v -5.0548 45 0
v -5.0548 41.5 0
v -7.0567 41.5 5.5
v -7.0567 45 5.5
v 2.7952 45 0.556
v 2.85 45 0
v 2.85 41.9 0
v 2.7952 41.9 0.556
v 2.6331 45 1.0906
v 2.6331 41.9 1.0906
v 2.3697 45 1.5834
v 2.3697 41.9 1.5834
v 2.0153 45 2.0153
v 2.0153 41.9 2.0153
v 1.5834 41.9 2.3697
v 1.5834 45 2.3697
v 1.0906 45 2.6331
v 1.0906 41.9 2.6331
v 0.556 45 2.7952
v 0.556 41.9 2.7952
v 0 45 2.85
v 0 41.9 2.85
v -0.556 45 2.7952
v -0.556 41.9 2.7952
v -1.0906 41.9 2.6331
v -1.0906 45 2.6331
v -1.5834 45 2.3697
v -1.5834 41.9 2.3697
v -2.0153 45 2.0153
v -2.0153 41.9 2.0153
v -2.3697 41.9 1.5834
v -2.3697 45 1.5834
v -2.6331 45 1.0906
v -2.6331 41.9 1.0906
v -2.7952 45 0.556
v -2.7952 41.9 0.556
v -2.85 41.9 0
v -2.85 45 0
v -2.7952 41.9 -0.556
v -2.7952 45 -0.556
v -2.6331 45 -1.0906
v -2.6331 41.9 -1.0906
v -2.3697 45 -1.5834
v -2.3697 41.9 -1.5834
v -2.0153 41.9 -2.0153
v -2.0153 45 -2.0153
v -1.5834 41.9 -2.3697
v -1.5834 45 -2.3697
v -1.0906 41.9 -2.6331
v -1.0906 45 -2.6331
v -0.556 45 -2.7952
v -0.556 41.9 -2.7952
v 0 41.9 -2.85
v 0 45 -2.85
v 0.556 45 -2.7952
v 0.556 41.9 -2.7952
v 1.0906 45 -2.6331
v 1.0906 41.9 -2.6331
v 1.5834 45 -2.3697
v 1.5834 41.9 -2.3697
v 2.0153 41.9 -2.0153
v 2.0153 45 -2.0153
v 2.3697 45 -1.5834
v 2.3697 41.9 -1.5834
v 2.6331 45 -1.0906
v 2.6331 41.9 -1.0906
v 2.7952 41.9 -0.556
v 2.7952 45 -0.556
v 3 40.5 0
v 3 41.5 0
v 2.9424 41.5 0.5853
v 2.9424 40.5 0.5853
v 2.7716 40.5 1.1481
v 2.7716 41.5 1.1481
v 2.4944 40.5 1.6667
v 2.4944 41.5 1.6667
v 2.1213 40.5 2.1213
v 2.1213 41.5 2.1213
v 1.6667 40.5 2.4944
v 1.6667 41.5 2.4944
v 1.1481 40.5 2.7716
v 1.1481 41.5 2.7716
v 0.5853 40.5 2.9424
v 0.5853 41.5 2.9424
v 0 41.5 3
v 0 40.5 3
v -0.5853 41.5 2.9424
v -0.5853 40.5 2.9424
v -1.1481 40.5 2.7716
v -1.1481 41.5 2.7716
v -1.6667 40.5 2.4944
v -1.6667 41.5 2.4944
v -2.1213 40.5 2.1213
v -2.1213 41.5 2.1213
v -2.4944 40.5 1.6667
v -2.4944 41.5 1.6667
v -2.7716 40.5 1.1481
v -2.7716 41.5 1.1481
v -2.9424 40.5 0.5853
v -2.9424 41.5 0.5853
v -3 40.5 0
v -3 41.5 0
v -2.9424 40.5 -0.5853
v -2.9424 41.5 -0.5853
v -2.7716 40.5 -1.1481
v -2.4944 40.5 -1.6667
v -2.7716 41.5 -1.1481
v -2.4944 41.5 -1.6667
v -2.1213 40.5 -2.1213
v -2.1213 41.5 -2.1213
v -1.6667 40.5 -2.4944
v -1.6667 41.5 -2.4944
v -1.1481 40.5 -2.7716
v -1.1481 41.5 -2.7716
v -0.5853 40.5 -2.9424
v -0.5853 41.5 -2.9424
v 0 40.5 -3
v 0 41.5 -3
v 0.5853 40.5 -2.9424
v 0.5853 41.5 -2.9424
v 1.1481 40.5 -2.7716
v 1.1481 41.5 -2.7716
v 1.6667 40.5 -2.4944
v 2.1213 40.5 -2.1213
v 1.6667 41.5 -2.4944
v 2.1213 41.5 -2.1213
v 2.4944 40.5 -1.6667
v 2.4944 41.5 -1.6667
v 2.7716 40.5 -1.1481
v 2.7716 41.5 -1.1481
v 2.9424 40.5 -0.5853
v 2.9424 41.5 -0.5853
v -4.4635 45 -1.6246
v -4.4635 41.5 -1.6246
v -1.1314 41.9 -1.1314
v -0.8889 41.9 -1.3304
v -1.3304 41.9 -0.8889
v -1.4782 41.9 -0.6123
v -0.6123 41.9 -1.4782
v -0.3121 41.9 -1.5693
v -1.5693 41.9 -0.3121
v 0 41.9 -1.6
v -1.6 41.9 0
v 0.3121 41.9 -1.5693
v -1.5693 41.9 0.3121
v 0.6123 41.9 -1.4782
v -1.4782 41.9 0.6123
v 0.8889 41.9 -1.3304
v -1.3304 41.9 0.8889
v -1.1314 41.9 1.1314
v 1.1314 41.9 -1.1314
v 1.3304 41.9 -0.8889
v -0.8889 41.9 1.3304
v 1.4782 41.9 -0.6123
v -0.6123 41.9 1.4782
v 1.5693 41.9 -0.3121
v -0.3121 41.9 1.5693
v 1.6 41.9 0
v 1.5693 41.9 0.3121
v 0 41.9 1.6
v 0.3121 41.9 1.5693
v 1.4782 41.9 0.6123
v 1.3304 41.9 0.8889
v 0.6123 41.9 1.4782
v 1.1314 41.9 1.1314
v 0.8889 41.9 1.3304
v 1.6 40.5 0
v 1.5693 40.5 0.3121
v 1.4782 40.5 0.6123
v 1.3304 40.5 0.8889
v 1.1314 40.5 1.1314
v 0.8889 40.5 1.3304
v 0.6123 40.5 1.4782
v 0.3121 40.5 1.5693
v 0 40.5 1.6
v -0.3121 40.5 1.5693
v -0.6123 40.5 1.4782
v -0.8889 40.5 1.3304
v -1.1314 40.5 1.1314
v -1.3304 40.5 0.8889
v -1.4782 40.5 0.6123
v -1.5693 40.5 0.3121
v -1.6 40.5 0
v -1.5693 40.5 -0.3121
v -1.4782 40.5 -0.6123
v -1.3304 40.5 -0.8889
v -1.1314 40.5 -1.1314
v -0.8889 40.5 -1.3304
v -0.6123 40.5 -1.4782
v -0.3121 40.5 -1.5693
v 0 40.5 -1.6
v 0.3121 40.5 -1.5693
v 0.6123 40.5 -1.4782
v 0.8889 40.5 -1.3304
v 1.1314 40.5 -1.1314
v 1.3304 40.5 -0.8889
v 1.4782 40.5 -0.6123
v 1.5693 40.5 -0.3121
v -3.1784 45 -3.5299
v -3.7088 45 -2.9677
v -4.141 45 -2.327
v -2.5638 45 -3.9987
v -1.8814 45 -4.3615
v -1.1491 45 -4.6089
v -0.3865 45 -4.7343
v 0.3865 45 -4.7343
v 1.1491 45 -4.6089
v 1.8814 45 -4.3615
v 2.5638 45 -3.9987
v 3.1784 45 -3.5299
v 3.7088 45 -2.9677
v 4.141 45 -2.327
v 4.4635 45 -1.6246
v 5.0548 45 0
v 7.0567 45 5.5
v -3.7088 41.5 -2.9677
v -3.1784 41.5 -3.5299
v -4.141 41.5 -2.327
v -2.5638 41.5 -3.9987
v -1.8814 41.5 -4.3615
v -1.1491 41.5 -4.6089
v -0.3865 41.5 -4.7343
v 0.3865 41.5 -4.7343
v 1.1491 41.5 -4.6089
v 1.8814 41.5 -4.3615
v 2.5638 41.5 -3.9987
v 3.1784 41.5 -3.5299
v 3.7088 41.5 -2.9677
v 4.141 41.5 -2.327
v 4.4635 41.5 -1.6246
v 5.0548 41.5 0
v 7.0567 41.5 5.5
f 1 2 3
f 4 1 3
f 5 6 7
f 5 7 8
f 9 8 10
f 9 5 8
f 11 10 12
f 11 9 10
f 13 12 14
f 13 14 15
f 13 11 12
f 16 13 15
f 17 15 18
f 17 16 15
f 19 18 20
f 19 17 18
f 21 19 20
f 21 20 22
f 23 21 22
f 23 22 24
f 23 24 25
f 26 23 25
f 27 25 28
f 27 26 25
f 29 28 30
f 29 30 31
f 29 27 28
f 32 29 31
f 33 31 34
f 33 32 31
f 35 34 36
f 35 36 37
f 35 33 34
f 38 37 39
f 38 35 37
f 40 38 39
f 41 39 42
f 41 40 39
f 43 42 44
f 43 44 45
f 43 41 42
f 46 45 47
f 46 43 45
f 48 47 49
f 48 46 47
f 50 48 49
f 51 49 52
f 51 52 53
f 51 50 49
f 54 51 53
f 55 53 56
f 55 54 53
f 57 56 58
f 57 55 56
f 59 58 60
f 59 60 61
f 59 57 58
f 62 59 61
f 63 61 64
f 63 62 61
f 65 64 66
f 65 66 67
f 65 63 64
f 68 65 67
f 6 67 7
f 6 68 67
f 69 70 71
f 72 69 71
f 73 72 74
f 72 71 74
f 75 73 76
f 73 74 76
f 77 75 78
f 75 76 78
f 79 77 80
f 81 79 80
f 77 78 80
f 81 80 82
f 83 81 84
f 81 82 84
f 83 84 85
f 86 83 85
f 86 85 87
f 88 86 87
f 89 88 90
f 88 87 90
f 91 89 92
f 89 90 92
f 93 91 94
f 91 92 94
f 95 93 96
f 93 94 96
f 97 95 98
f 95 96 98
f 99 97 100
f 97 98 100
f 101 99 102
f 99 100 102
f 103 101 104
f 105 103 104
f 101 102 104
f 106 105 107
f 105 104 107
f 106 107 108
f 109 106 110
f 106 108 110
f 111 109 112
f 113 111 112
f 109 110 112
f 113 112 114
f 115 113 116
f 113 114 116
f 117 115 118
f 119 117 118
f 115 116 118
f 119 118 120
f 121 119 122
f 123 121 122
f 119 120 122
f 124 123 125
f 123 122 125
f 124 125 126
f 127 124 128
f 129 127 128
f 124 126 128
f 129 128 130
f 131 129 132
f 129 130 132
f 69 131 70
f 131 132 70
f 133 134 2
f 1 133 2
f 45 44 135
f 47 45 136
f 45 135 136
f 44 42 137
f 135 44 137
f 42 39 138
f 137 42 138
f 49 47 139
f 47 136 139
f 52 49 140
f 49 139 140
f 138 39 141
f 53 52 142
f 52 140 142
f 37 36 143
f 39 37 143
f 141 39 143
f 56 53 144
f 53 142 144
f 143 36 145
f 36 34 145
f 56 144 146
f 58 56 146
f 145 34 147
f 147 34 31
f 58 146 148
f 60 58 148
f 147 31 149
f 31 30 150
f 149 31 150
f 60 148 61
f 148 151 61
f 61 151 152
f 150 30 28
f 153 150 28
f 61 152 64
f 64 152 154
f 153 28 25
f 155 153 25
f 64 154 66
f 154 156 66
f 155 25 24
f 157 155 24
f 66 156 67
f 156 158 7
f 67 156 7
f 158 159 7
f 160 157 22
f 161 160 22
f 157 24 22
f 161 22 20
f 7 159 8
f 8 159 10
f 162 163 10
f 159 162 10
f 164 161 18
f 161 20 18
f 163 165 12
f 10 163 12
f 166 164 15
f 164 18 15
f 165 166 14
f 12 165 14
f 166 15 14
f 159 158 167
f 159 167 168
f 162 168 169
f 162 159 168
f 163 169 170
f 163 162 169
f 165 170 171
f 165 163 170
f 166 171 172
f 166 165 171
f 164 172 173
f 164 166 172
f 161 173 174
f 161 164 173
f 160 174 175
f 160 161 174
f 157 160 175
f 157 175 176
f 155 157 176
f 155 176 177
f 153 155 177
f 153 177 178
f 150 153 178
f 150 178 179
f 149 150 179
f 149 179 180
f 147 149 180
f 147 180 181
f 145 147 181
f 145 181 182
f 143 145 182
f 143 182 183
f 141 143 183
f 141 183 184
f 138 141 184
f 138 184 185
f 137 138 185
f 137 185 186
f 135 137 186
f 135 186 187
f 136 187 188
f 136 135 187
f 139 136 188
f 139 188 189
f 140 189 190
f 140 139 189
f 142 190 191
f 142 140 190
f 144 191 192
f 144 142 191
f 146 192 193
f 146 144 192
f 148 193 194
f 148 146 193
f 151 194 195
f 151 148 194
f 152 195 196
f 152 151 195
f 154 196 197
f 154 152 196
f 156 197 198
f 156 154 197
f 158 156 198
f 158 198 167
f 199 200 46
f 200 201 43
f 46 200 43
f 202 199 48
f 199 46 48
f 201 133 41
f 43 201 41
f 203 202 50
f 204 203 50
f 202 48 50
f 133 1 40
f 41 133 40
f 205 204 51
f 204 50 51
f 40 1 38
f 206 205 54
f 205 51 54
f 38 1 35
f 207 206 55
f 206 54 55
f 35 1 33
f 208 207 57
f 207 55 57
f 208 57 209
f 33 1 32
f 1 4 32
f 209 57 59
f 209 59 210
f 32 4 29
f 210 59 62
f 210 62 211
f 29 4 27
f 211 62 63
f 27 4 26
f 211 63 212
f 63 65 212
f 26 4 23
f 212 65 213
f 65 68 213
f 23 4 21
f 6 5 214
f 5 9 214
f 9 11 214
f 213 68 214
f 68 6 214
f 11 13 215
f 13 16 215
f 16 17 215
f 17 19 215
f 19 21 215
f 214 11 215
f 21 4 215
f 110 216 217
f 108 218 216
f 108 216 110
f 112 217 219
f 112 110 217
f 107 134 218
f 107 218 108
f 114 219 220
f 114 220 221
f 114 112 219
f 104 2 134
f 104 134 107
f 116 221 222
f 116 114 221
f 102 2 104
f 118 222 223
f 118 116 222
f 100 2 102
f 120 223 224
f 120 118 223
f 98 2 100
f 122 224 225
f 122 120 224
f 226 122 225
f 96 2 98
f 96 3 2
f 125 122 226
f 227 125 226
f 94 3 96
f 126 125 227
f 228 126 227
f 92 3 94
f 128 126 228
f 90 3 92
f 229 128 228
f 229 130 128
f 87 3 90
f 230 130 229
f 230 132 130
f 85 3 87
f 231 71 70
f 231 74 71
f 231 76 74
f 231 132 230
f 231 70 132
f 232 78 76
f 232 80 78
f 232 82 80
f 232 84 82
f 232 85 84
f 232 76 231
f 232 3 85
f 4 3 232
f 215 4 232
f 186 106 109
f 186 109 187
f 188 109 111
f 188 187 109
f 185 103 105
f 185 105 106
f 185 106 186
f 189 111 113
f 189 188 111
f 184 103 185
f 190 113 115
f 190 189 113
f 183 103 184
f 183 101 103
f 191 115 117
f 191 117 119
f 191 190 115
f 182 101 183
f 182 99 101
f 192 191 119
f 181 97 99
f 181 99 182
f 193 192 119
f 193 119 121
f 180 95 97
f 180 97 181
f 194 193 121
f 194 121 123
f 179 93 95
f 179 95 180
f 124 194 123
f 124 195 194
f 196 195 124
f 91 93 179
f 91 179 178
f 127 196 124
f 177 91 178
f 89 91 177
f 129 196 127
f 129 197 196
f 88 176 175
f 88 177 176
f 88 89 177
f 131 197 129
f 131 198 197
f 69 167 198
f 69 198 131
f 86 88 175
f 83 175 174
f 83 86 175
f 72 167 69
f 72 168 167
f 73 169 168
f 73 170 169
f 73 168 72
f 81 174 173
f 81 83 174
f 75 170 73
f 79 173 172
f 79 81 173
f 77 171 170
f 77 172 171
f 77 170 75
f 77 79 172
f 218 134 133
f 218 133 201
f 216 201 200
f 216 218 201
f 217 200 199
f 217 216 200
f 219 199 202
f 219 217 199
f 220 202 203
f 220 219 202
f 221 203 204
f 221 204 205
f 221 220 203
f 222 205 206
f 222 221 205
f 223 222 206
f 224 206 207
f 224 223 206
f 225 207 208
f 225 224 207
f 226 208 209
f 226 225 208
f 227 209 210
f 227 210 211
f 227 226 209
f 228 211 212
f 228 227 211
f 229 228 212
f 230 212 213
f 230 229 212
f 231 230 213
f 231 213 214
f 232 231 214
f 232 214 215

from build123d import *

# Parameters (mm, degrees)
CYLINDER011_R     = 2.85
CYLINDER011_DEPTH = 3.1
CYLINDER010_R     = 1.6
CYLINDER010_DEPTH = 4.5
CYLINDER001_R     = 3
CYLINDER001_DEPTH = 1
EXTRUDE001_DEPTH  = 3.5


with BuildPart() as bearingbracket_m3head:
    # Cylinder011 → Cylinder011 (new body)
    with BuildSketch(Plane.XZ):
        Circle(CYLINDER011_R)
    extrude(amount=CYLINDER011_DEPTH)


with BuildPart() as bearingbracket_m3cutout:
    # Cylinder010 → Cylinder010 (new body)
    with BuildSketch(Plane.XZ):
        Circle(CYLINDER010_R)
    extrude(amount=CYLINDER010_DEPTH)

    # Fusion: union bearingBracket_m3Head
    add(bearingbracket_m3head.part)


with BuildPart() as bearingbracket_m3cutout_1:
    # Fusion placement: moved
    add(bearingbracket_m3cutout.part.moved(Location((0, 3.5, 0))))


with BuildPart() as bearingbracket_spacer:
    # Cylinder001 → Cylinder001 (new body)
    with BuildSketch(Plane.XZ):
        Circle(CYLINDER001_R)
    extrude(amount=CYLINDER001_DEPTH)


with BuildPart() as bearingbracket:
    # Sketch001 → Extrude001 (new body)
    with BuildSketch(Plane.XZ):
        with BuildLine():
            ThreePointArc((-4.46354, -1.624596), (0, -4.75), (4.46354, -1.624596))
            Line((4.46354, -1.624596), (5.054844, 0))
            Line((5.054844, 0), (7.056681, 5.5))
            Line((-7.056681, 5.5), (7.056681, 5.5))
            Line((-5.054844, 0), (-7.056681, 5.5))
            Line((-4.46354, -1.624596), (-5.054844, 0))
        make_face()
    extrude(amount=-EXTRUDE001_DEPTH)

    # Fusion001: union bearingBracket_spacer
    add(bearingbracket_spacer.part)

    # Cut011: cut bearingBracket_m3Cutout
    add(bearingbracket_m3cutout_1.part, mode=Mode.SUBTRACT)


with BuildPart() as bearingbracket_1:
    # Cut011 placement: moved
    add(bearingbracket.part.moved(Location((0, 41.5, 0))))


solid = bearingbracket_1.part
